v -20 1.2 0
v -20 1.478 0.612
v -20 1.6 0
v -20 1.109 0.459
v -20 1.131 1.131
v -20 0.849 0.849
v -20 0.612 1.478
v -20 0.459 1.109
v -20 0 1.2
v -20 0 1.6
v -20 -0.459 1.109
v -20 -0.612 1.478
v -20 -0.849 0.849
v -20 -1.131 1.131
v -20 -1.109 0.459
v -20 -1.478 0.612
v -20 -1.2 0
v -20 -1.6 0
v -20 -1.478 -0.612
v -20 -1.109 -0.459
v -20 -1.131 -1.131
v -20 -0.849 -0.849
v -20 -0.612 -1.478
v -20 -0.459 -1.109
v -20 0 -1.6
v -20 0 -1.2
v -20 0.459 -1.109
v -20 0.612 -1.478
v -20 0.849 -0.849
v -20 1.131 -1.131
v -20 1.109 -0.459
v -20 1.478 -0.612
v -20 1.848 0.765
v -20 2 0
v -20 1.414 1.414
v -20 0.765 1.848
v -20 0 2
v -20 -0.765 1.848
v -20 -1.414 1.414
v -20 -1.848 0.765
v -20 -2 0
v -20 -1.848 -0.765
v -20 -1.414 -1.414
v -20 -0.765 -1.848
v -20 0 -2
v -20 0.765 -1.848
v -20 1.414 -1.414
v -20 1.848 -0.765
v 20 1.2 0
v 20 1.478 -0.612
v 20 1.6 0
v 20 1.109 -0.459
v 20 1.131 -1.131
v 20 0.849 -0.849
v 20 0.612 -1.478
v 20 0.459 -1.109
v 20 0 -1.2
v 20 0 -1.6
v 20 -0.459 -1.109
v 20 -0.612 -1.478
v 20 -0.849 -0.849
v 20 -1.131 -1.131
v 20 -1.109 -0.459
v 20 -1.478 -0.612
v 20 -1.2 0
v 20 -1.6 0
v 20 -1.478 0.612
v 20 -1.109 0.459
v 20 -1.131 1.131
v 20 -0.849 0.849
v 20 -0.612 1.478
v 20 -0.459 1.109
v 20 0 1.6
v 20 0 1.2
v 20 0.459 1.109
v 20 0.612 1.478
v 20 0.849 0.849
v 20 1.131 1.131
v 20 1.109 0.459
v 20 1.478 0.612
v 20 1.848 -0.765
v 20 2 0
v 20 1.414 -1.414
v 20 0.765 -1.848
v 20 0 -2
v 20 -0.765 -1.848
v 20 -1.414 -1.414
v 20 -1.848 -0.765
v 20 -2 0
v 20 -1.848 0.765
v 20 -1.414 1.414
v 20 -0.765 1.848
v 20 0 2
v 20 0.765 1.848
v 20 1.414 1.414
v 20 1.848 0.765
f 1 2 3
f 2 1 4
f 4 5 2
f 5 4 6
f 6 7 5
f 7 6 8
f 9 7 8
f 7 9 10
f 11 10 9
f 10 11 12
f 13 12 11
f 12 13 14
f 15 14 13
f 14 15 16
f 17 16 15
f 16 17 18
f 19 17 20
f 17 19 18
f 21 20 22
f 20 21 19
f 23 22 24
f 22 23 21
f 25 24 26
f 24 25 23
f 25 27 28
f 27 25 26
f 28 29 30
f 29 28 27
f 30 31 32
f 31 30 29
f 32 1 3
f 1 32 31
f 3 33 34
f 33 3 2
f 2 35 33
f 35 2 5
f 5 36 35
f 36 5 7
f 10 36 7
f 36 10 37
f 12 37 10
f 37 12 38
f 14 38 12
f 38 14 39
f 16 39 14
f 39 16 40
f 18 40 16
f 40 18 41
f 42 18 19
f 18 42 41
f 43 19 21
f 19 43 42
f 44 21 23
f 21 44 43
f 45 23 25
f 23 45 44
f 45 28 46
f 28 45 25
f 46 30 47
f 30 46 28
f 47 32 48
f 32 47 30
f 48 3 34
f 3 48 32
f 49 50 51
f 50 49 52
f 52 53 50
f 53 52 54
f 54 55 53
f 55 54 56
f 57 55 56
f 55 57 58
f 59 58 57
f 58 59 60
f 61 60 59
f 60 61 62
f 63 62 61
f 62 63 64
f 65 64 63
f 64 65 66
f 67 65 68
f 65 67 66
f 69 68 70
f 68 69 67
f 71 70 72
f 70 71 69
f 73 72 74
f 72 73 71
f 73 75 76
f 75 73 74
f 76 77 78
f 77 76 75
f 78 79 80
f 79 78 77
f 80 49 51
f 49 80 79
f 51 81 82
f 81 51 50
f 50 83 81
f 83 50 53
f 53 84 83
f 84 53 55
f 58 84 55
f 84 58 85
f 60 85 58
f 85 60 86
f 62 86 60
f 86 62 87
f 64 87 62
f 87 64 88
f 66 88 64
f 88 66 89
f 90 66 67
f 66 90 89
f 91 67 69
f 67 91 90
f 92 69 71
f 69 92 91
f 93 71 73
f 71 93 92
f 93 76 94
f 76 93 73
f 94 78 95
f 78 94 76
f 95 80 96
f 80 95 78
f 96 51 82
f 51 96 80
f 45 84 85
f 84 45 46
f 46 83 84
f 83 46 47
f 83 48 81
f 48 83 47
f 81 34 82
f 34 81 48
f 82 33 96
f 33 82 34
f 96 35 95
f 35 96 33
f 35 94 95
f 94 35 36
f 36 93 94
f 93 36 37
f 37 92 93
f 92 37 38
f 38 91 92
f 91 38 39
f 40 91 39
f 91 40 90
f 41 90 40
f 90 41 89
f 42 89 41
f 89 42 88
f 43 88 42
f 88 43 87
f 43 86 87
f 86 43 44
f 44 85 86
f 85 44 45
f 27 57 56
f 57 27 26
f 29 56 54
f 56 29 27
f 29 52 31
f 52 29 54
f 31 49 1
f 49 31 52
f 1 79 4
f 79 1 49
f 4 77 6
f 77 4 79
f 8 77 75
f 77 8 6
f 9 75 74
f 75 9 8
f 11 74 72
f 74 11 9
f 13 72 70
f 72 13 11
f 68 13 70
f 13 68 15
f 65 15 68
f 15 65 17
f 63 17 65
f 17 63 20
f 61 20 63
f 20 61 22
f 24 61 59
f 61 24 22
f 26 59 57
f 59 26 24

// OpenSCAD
// file: ../p/4-4cyli.scad
use <../lib.scad>
function ldraw_lib__4_4cyli() = [
// 0 Cylinder 1.0
// 0 Name: 4-4cyli.dat
// 0 Author: James Jessiman
// 0 !LDRAW_ORG Primitive UPDATE 2005-01
// 0 !LICENSE Licensed under CC BY 2.0 and CC BY 4.0 : see CAreadme.txt
// 
// 0 BFC CERTIFY CCW
  [0,"BFC","CERTIFY"],
  [0,"BFC","CCW"],
// 
// 0 !HISTORY 1998-12-15 [PTadmin] Official Update 1998-10
// 0 !HISTORY 2002-03-23 [sbliss] Added BFC statement; merged headers from files in distributions LDraw 0.27 and Complete.
// 0 !HISTORY 2002-04-25 [PTadmin] Official Update 2002-02
// 0 !HISTORY 2004-12-14 [guyvivan] BFC CCW
// 0 !HISTORY 2005-12-28 [PTadmin] Official Update 2005-01
// 0 !HISTORY 2007-06-24 [PTadmin] Header formatted for Contributor Agreement
// 0 !HISTORY 2008-07-01 [PTadmin] Official Update 2008-01
// 
// 
// 4 16 1 1 0 0.9239 1 0.3827 0.9239 0 0.3827 1 0 0
  [4,16,1,1,0,0.9239,1,0.3827,0.9239,0,0.3827,1,0,0],
// 5 24 1 0 0 1 1 0 0.9239 0 0.3827 0.9239 0 -0.3827
  [5,24,1,0,0,1,1,0,0.9239,0,0.3827,0.9239,0,-0.3827],
// 4 16 0.9239 1 0.3827 0.7071 1 0.7071 0.7071 0 0.7071 0.9239 0 0.3827
  [4,16,0.9239,1,0.3827,0.7071,1,0.7071,0.7071,0,0.7071,0.9239,0,0.3827],
// 5 24 0.9239 0 0.3827 0.9239 1 0.3827 0.7071 0 0.7071 1 0 0
  [5,24,0.9239,0,0.3827,0.9239,1,0.3827,0.7071,0,0.7071,1,0,0],
// 4 16 0.7071 1 0.7071 0.3827 1 0.9239 0.3827 0 0.9239 0.7071 0 0.7071
  [4,16,0.7071,1,0.7071,0.3827,1,0.9239,0.3827,0,0.9239,0.7071,0,0.7071],
// 5 24 0.7071 0 0.7071 0.7071 1 0.7071 0.3827 0 0.9239 0.9239 0 0.3827
  [5,24,0.7071,0,0.7071,0.7071,1,0.7071,0.3827,0,0.9239,0.9239,0,0.3827],
// 4 16 0.3827 1 0.9239 0 1 1 0 0 1 0.3827 0 0.9239
  [4,16,0.3827,1,0.9239,0,1,1,0,0,1,0.3827,0,0.9239],
// 5 24 0.3827 0 0.9239 0.3827 1 0.9239 0 0 1 0.7071 0 0.7071
  [5,24,0.3827,0,0.9239,0.3827,1,0.9239,0,0,1,0.7071,0,0.7071],
// 4 16 0 1 1 -0.3827 1 0.9239 -0.3827 0 0.9239 0 0 1
  [4,16,0,1,1,-0.3827,1,0.9239,-0.3827,0,0.9239,0,0,1],
// 5 24 0 0 1 0 1 1 -0.3827 0 0.9239 0.3827 0 0.9239
  [5,24,0,0,1,0,1,1,-0.3827,0,0.9239,0.3827,0,0.9239],
// 4 16 -0.3827 1 0.9239 -0.7071 1 0.7071 -0.7071 0 0.7071 -0.3827 0 0.9239
  [4,16,-0.3827,1,0.9239,-0.7071,1,0.7071,-0.7071,0,0.7071,-0.3827,0,0.9239],
// 5 24 -0.3827 0 0.9239 -0.3827 1 0.9239 -0.7071 0 0.7071 0 0 1
  [5,24,-0.3827,0,0.9239,-0.3827,1,0.9239,-0.7071,0,0.7071,0,0,1],
// 4 16 -0.7071 1 0.7071 -0.9239 1 0.3827 -0.9239 0 0.3827 -0.7071 0 0.7071
  [4,16,-0.7071,1,0.7071,-0.9239,1,0.3827,-0.9239,0,0.3827,-0.7071,0,0.7071],
// 5 24 -0.7071 0 0.7071 -0.7071 1 0.7071 -0.9239 0 0.3827 -0.3827 0 0.9239
  [5,24,-0.7071,0,0.7071,-0.7071,1,0.7071,-0.9239,0,0.3827,-0.3827,0,0.9239],
// 4 16 -0.9239 1 0.3827 -1 1 0 -1 0 0 -0.9239 0 0.3827
  [4,16,-0.9239,1,0.3827,-1,1,0,-1,0,0,-0.9239,0,0.3827],
// 5 24 -0.9239 0 0.3827 -0.9239 1 0.3827 -1 0 0 -0.7071 0 0.7071
  [5,24,-0.9239,0,0.3827,-0.9239,1,0.3827,-1,0,0,-0.7071,0,0.7071],
// 4 16 -1 1 0 -0.9239 1 -0.3827 -0.9239 0 -0.3827 -1 0 0
  [4,16,-1,1,0,-0.9239,1,-0.3827,-0.9239,0,-0.3827,-1,0,0],
// 5 24 -1 0 0 -1 1 0 -0.9239 0 -0.3827 -0.9239 0 0.3827
  [5,24,-1,0,0,-1,1,0,-0.9239,0,-0.3827,-0.9239,0,0.3827],
// 4 16 -0.9239 1 -0.3827 -0.7071 1 -0.7071 -0.7071 0 -0.7071 -0.9239 0 -0.3827
  [4,16,-0.9239,1,-0.3827,-0.7071,1,-0.7071,-0.7071,0,-0.7071,-0.9239,0,-0.3827],
// 5 24 -0.9239 0 -0.3827 -0.9239 1 -0.3827 -0.7071 0 -0.7071 -1 0 0
  [5,24,-0.9239,0,-0.3827,-0.9239,1,-0.3827,-0.7071,0,-0.7071,-1,0,0],
// 4 16 -0.7071 1 -0.7071 -0.3827 1 -0.9239 -0.3827 0 -0.9239 -0.7071 0 -0.7071
  [4,16,-0.7071,1,-0.7071,-0.3827,1,-0.9239,-0.3827,0,-0.9239,-0.7071,0,-0.7071],
// 5 24 -0.7071 0 -0.7071 -0.7071 1 -0.7071 -0.3827 0 -0.9239 -0.9239 0 -0.3827
  [5,24,-0.7071,0,-0.7071,-0.7071,1,-0.7071,-0.3827,0,-0.9239,-0.9239,0,-0.3827],
// 4 16 -0.3827 1 -0.9239 0 1 -1 0 0 -1 -0.3827 0 -0.9239
  [4,16,-0.3827,1,-0.9239,0,1,-1,0,0,-1,-0.3827,0,-0.9239],
// 5 24 -0.3827 0 -0.9239 -0.3827 1 -0.9239 0 0 -1 -0.7071 0 -0.7071
  [5,24,-0.3827,0,-0.9239,-0.3827,1,-0.9239,0,0,-1,-0.7071,0,-0.7071],
// 4 16 0 1 -1 0.3827 1 -0.9239 0.3827 0 -0.9239 0 0 -1
  [4,16,0,1,-1,0.3827,1,-0.9239,0.3827,0,-0.9239,0,0,-1],
// 5 24 0 0 -1 0 1 -1 0.3827 0 -0.9239 -0.3827 0 -0.9239
  [5,24,0,0,-1,0,1,-1,0.3827,0,-0.9239,-0.3827,0,-0.9239],
// 4 16 0.3827 1 -0.9239 0.7071 1 -0.7071 0.7071 0 -0.7071 0.3827 0 -0.9239
  [4,16,0.3827,1,-0.9239,0.7071,1,-0.7071,0.7071,0,-0.7071,0.3827,0,-0.9239],
// 5 24 0.3827 0 -0.9239 0.3827 1 -0.9239 0.7071 0 -0.7071 0 0 -1
  [5,24,0.3827,0,-0.9239,0.3827,1,-0.9239,0.7071,0,-0.7071,0,0,-1],
// 4 16 0.7071 1 -0.7071 0.9239 1 -0.3827 0.9239 0 -0.3827 0.7071 0 -0.7071
  [4,16,0.7071,1,-0.7071,0.9239,1,-0.3827,0.9239,0,-0.3827,0.7071,0,-0.7071],
// 5 24 0.7071 0 -0.7071 0.7071 1 -0.7071 0.9239 0 -0.3827 0.3827 0 -0.9239
  [5,24,0.7071,0,-0.7071,0.7071,1,-0.7071,0.9239,0,-0.3827,0.3827,0,-0.9239],
// 4 16 0.9239 1 -0.3827 1 1 0 1 0 0 0.9239 0 -0.3827
  [4,16,0.9239,1,-0.3827,1,1,0,1,0,0,0.9239,0,-0.3827],
// 5 24 0.9239 0 -0.3827 0.9239 1 -0.3827 1 0 0 0.7071 0 -0.7071
  [5,24,0.9239,0,-0.3827,0.9239,1,-0.3827,1,0,0,0.7071,0,-0.7071],
// 0
];
module ldraw_lib__4_4cyli(step=0, col=false, unit=2/5, alt=false, line=0.2, solid=!$preview)
    makepoly(ldraw_lib__4_4cyli(), step=step, col=col, unit=unit, alt=alt, line=line, solid=solid);
ldraw_lib__4_4cyli(line=0.2);
// file: ../p/4-4ring4.scad
use <../lib.scad>
function ldraw_lib__4_4ring4() = [
// 0 Ring  4 x 1.0
// 0 Name: 4-4ring4.dat
// 0 Author: James Jessiman
// 0 !LDRAW_ORG Primitive UPDATE 2009-01
// 0 !LICENSE Licensed under CC BY 2.0 and CC BY 4.0 : see CAreadme.txt
// 
// 0 BFC CERTIFY CCW
  [0,"BFC","CERTIFY"],
  [0,"BFC","CCW"],
// 
// 0 !HISTORY 1998-12-15 [PTadmin] Official Update 1998-10
// 0 !HISTORY 2002-04-08 [BrickCaster] Modified for BFC compliance
// 0 !HISTORY 2002-04-25 [PTadmin] Official Update 2002-02
// 0 !HISTORY 2007-06-24 [PTadmin] Header formatted for Contributor Agreement
// 0 !HISTORY 2008-07-01 [PTadmin] Official Update 2008-01
// 0 !HISTORY 2008-08-26 [cwdee] Switch polygon winding and rename
// 0 !HISTORY 2009-05-02 [PTadmin] Official Update 2009-01
// 
// 
// 4 16 -1.9135 0 4.6195 -1.5308 0 3.6956 0 0 4 0 0 5
  [4,16,-1.9135,0,4.6195,-1.5308,0,3.6956,0,0,4,0,0,5],
// 4 16 -3.5355 0 3.5355 -2.8284 0 2.8284 -1.5308 0 3.6956 -1.9135 0 4.6195
  [4,16,-3.5355,0,3.5355,-2.8284,0,2.8284,-1.5308,0,3.6956,-1.9135,0,4.6195],
// 4 16 -4.6195 0 1.9135 -3.6956 0 1.5308 -2.8284 0 2.8284 -3.5355 0 3.5355
  [4,16,-4.6195,0,1.9135,-3.6956,0,1.5308,-2.8284,0,2.8284,-3.5355,0,3.5355],
// 4 16 -5 0 0 -4 0 0 -3.6956 0 1.5308 -4.6195 0 1.9135
  [4,16,-5,0,0,-4,0,0,-3.6956,0,1.5308,-4.6195,0,1.9135],
// 4 16 -4.6195 0 -1.9135 -3.6956 0 -1.5308 -4 0 0 -5 0 0
  [4,16,-4.6195,0,-1.9135,-3.6956,0,-1.5308,-4,0,0,-5,0,0],
// 4 16 -3.5355 0 -3.5355 -2.8284 0 -2.8284 -3.6956 0 -1.5308 -4.6195 0 -1.9135
  [4,16,-3.5355,0,-3.5355,-2.8284,0,-2.8284,-3.6956,0,-1.5308,-4.6195,0,-1.9135],
// 4 16 -1.9135 0 -4.6195 -1.5308 0 -3.6956 -2.8284 0 -2.8284 -3.5355 0 -3.5355
  [4,16,-1.9135,0,-4.6195,-1.5308,0,-3.6956,-2.8284,0,-2.8284,-3.5355,0,-3.5355],
// 4 16 0 0 -5 0 0 -4 -1.5308 0 -3.6956 -1.9135 0 -4.6195
  [4,16,0,0,-5,0,0,-4,-1.5308,0,-3.6956,-1.9135,0,-4.6195],
// 4 16 1.9135 0 -4.6195 1.5308 0 -3.6956 0 0 -4 0 0 -5
  [4,16,1.9135,0,-4.6195,1.5308,0,-3.6956,0,0,-4,0,0,-5],
// 4 16 3.5355 0 -3.5355 2.8284 0 -2.8284 1.5308 0 -3.6956 1.9135 0 -4.6195
  [4,16,3.5355,0,-3.5355,2.8284,0,-2.8284,1.5308,0,-3.6956,1.9135,0,-4.6195],
// 4 16 4.6195 0 -1.9135 3.6956 0 -1.5308 2.8284 0 -2.8284 3.5355 0 -3.5355
  [4,16,4.6195,0,-1.9135,3.6956,0,-1.5308,2.8284,0,-2.8284,3.5355,0,-3.5355],
// 4 16 5 0 0 4 0 0 3.6956 0 -1.5308 4.6195 0 -1.9135
  [4,16,5,0,0,4,0,0,3.6956,0,-1.5308,4.6195,0,-1.9135],
// 4 16 4.6195 0 1.9135 3.6956 0 1.5308 4 0 0 5 0 0
  [4,16,4.6195,0,1.9135,3.6956,0,1.5308,4,0,0,5,0,0],
// 4 16 3.5355 0 3.5355 2.8284 0 2.8284 3.6956 0 1.5308 4.6195 0 1.9135
  [4,16,3.5355,0,3.5355,2.8284,0,2.8284,3.6956,0,1.5308,4.6195,0,1.9135],
// 4 16 1.9135 0 4.6195 1.5308 0 3.6956 2.8284 0 2.8284 3.5355 0 3.5355
  [4,16,1.9135,0,4.6195,1.5308,0,3.6956,2.8284,0,2.8284,3.5355,0,3.5355],
// 4 16 0 0 5 0 0 4 1.5308 0 3.6956 1.9135 0 4.6195
  [4,16,0,0,5,0,0,4,1.5308,0,3.6956,1.9135,0,4.6195],
// 0
];
module ldraw_lib__4_4ring4(step=0, col=false, unit=2/5, alt=false, line=0.2, solid=!$preview)
    makepoly(ldraw_lib__4_4ring4(), step=step, col=col, unit=unit, alt=alt, line=line, solid=solid);
ldraw_lib__4_4ring4(line=0.2);
// file: ../p/4-4ring3.scad
use <../lib.scad>
function ldraw_lib__4_4ring3() = [
// 0 Ring  3 x 1.0
// 0 Name: 4-4ring3.dat
// 0 Author: James Jessiman
// 0 !LDRAW_ORG Primitive UPDATE 2009-01
// 0 !LICENSE Licensed under CC BY 2.0 and CC BY 4.0 : see CAreadme.txt
// 
// 0 BFC CERTIFY CCW
  [0,"BFC","CERTIFY"],
  [0,"BFC","CCW"],
// 
// 0 !HISTORY 1998-12-15 [PTadmin] Official Update 1998-10
// 0 !HISTORY 2002-04-05 [hafhead] Added BFC statement
// 0 !HISTORY 2002-04-25 [PTadmin] Official Update 2002-02
// 0 !HISTORY 2007-06-24 [PTadmin] Header formatted for Contributor Agreement
// 0 !HISTORY 2008-07-01 [PTadmin] Official Update 2008-01
// 0 !HISTORY 2008-08-26 [cwdee] Switch polygon winding and rename
// 0 !HISTORY 2009-05-02 [PTadmin] Official Update 2009-01
// 
// 
// 4 16 -1.5308 0 3.6956 -1.1481 0 2.7717 0 0 3 0 0 4
  [4,16,-1.5308,0,3.6956,-1.1481,0,2.7717,0,0,3,0,0,4],
// 4 16 -2.8284 0 2.8284 -2.1213 0 2.1213 -1.1481 0 2.7717 -1.5308 0 3.6956
  [4,16,-2.8284,0,2.8284,-2.1213,0,2.1213,-1.1481,0,2.7717,-1.5308,0,3.6956],
// 4 16 -3.6956 0 1.5308 -2.7717 0 1.1481 -2.1213 0 2.1213 -2.8284 0 2.8284
  [4,16,-3.6956,0,1.5308,-2.7717,0,1.1481,-2.1213,0,2.1213,-2.8284,0,2.8284],
// 4 16 -4 0 0 -3 0 0 -2.7717 0 1.1481 -3.6956 0 1.5308
  [4,16,-4,0,0,-3,0,0,-2.7717,0,1.1481,-3.6956,0,1.5308],
// 4 16 -3.6956 0 -1.5308 -2.7717 0 -1.1481 -3 0 0 -4 0 0
  [4,16,-3.6956,0,-1.5308,-2.7717,0,-1.1481,-3,0,0,-4,0,0],
// 4 16 -2.8284 0 -2.8284 -2.1213 0 -2.1213 -2.7717 0 -1.1481 -3.6956 0 -1.5308
  [4,16,-2.8284,0,-2.8284,-2.1213,0,-2.1213,-2.7717,0,-1.1481,-3.6956,0,-1.5308],
// 4 16 -1.5308 0 -3.6956 -1.1481 0 -2.7717 -2.1213 0 -2.1213 -2.8284 0 -2.8284
  [4,16,-1.5308,0,-3.6956,-1.1481,0,-2.7717,-2.1213,0,-2.1213,-2.8284,0,-2.8284],
// 4 16 0 0 -4 0 0 -3 -1.1481 0 -2.7717 -1.5308 0 -3.6956
  [4,16,0,0,-4,0,0,-3,-1.1481,0,-2.7717,-1.5308,0,-3.6956],
// 4 16 1.5308 0 -3.6956 1.1481 0 -2.7717 0 0 -3 0 0 -4
  [4,16,1.5308,0,-3.6956,1.1481,0,-2.7717,0,0,-3,0,0,-4],
// 4 16 2.8284 0 -2.8284 2.1213 0 -2.1213 1.1481 0 -2.7717 1.5308 0 -3.6956
  [4,16,2.8284,0,-2.8284,2.1213,0,-2.1213,1.1481,0,-2.7717,1.5308,0,-3.6956],
// 4 16 3.6956 0 -1.5308 2.7717 0 -1.1481 2.1213 0 -2.1213 2.8284 0 -2.8284
  [4,16,3.6956,0,-1.5308,2.7717,0,-1.1481,2.1213,0,-2.1213,2.8284,0,-2.8284],
// 4 16 4 0 0 3 0 0 2.7717 0 -1.1481 3.6956 0 -1.5308
  [4,16,4,0,0,3,0,0,2.7717,0,-1.1481,3.6956,0,-1.5308],
// 4 16 3.6956 0 1.5308 2.7717 0 1.1481 3 0 0 4 0 0
  [4,16,3.6956,0,1.5308,2.7717,0,1.1481,3,0,0,4,0,0],
// 4 16 2.8284 0 2.8284 2.1213 0 2.1213 2.7717 0 1.1481 3.6956 0 1.5308
  [4,16,2.8284,0,2.8284,2.1213,0,2.1213,2.7717,0,1.1481,3.6956,0,1.5308],
// 4 16 1.5308 0 3.6956 1.1481 0 2.7717 2.1213 0 2.1213 2.8284 0 2.8284
  [4,16,1.5308,0,3.6956,1.1481,0,2.7717,2.1213,0,2.1213,2.8284,0,2.8284],
// 4 16 0 0 4 0 0 3 1.1481 0 2.7717 1.5308 0 3.6956
  [4,16,0,0,4,0,0,3,1.1481,0,2.7717,1.5308,0,3.6956],
// 0
];
module ldraw_lib__4_4ring3(step=0, col=false, unit=2/5, alt=false, line=0.2, solid=!$preview)
    makepoly(ldraw_lib__4_4ring3(), step=step, col=col, unit=unit, alt=alt, line=line, solid=solid);
ldraw_lib__4_4ring3(line=0.2);
// file: ../p/4-4edge.scad
use <../lib.scad>
function ldraw_lib__4_4edge() = [
// 0 Circle 1.0
// 0 Name: 4-4edge.dat
// 0 Author: James Jessiman
// 0 !LDRAW_ORG Primitive UPDATE 2017-01
// 0 !LICENSE Licensed under CC BY 2.0 and CC BY 4.0 : see CAreadme.txt
// 
// 0 BFC CERTIFY CCW
  [0,"BFC","CERTIFY"],
  [0,"BFC","CCW"],
// 
// 0 !HISTORY 1998-12-15 [PTadmin] Official Update 1998-10
// 0 !HISTORY 2005-12-28 [PTadmin] Official Update 2005-01
// 0 !HISTORY 2007-06-24 [PTadmin] Header formatted for Contributor Agreement
// 0 !HISTORY 2008-07-01 [PTadmin] Official Update 2008-01
// 0 !HISTORY 2017-01-15 [Steffen] BFCed
// 0 !HISTORY 2017-12-30 [PTadmin] Official Update 2017-01
// 
// 
// 2 24 1 0 0 0.9239 0 0.3827
  [2,24,1,0,0,0.9239,0,0.3827],
// 2 24 0.9239 0 0.3827 0.7071 0 0.7071
  [2,24,0.9239,0,0.3827,0.7071,0,0.7071],
// 2 24 0.7071 0 0.7071 0.3827 0 0.9239
  [2,24,0.7071,0,0.7071,0.3827,0,0.9239],
// 2 24 0.3827 0 0.9239 0 0 1
  [2,24,0.3827,0,0.9239,0,0,1],
// 2 24 0 0 1 -0.3827 0 0.9239
  [2,24,0,0,1,-0.3827,0,0.9239],
// 2 24 -0.3827 0 0.9239 -0.7071 0 0.7071
  [2,24,-0.3827,0,0.9239,-0.7071,0,0.7071],
// 2 24 -0.7071 0 0.7071 -0.9239 0 0.3827
  [2,24,-0.7071,0,0.7071,-0.9239,0,0.3827],
// 2 24 -0.9239 0 0.3827 -1 0 -0
  [2,24,-0.9239,0,0.3827,-1,0,-0],
// 2 24 -1 0 -0 -0.9239 0 -0.3827
  [2,24,-1,0,-0,-0.9239,0,-0.3827],
// 2 24 -0.9239 0 -0.3827 -0.7071 0 -0.7071
  [2,24,-0.9239,0,-0.3827,-0.7071,0,-0.7071],
// 2 24 -0.7071 0 -0.7071 -0.3827 0 -0.9239
  [2,24,-0.7071,0,-0.7071,-0.3827,0,-0.9239],
// 2 24 -0.3827 0 -0.9239 0 0 -1
  [2,24,-0.3827,0,-0.9239,0,0,-1],
// 2 24 0 0 -1 0.3827 0 -0.9239
  [2,24,0,0,-1,0.3827,0,-0.9239],
// 2 24 0.3827 0 -0.9239 0.7071 0 -0.7071
  [2,24,0.3827,0,-0.9239,0.7071,0,-0.7071],
// 2 24 0.7071 0 -0.7071 0.9239 0 -0.3827
  [2,24,0.7071,0,-0.7071,0.9239,0,-0.3827],
// 2 24 0.9239 0 -0.3827 1 0 0
  [2,24,0.9239,0,-0.3827,1,0,0],
];
module ldraw_lib__4_4edge(step=0, col=false, unit=2/5, alt=false, line=0.2, solid=!$preview)
    makepoly(ldraw_lib__4_4edge(), step=step, col=col, unit=unit, alt=alt, line=line, solid=solid);
ldraw_lib__4_4edge(line=0.2);
// file: 71533k03.scad
use <../lib.scad>
use <../p/4-4cyli.scad>
function ldraw_lib__71533k03() = [
// 0 ~Technic Pneumatic Tube Segment
// 0 Name: 71533k03.dat
// 0 Author: Jaco van der Molen [Jaco]
// 0 !LDRAW_ORG Part Flexible_Section UPDATE 2020-01
// 0 !LICENSE Licensed under CC BY 2.0 and CC BY 4.0 : see CAreadme.txt
// 
// 0 BFC CERTIFY CW
  [0,"BFC","CERTIFY"],
  [0,"BFC","CW"],
// 
// 0 !HISTORY 2003-11-30 [Steffen] BFCed
// 0 !HISTORY 2009-12-29 [PTadmin] Official Update 2009-03
// 0 !HISTORY 2020-06-27 [PTadmin] Renamed from 166
// 0 !HISTORY 2020-06-28 [PTadmin] Official Update 2020-01
// 
// 
// 1 16 0 0 0 5 0 0 0 1 0 0 0 5 4-4cyli.dat
  [1,16,0,0,0,5,0,0,0,1,0,0,0,5, ldraw_lib__4_4cyli()],
// 0 BFC INVERTNEXT
  [0,"BFC","INVERTNEXT"],
// 1 16 0 0 0 3 0 0 0 1 0 0 0 3 4-4cyli.dat
  [1,16,0,0,0,3,0,0,0,1,0,0,0,3, ldraw_lib__4_4cyli()],
// 0
];
module ldraw_lib__71533k03(step=0, col=false, unit=2/5, alt=false, line=0.2, solid=!$preview)
    makepoly(ldraw_lib__71533k03(), step=step, col=col, unit=unit, alt=alt, line=line, solid=solid);
ldraw_lib__71533k03(line=0.2);
// file: 71533k02.scad
use <../lib.scad>
use <../p/4-4edge.scad>
use <../p/4-4ring3.scad>
use <../p/4-4ring4.scad>
function ldraw_lib__71533k02() = [
// 0 ~Technic Pneumatic Tube End (Non-Bulged)
// 0 Name: 71533k02.dat
// 0 Author: Steffen [Steffen]
// 0 !LDRAW_ORG Part Flexible_Section UPDATE 2020-01
// 0 !LICENSE Licensed under CC BY 2.0 and CC BY 4.0 : see CAreadme.txt
// 
// 0 BFC CERTIFY CCW
  [0,"BFC","CERTIFY"],
  [0,"BFC","CCW"],
// 
// 0 !HISTORY 2020-06-28 [PTadmin] Official Update 2020-01
// 
// 
// 0 // This file goes together with 71533k01.dat and 71533k03.dat.
// 0 // Those 3 files can be used to create Technic Pneumatic Tubes
// 0 // with either bulged or non-bulged ends.
// 
// 1 16 0 0 0 1 0 0 0 1 0 0 0 1 4-4ring3.dat
  [1,16,0,0,0,1,0,0,0,1,0,0,0,1, ldraw_lib__4_4ring3()],
// 1 16 0 0 0 1 0 0 0 1 0 0 0 1 4-4ring4.dat
  [1,16,0,0,0,1,0,0,0,1,0,0,0,1, ldraw_lib__4_4ring4()],
// 1 16 0 0 0 3 0 0 0 3 0 0 0 3 4-4edge.dat
  [1,16,0,0,0,3,0,0,0,3,0,0,0,3, ldraw_lib__4_4edge()],
// 1 16 0 0 0 5 0 0 0 5 0 0 0 5 4-4edge.dat
  [1,16,0,0,0,5,0,0,0,5,0,0,0,5, ldraw_lib__4_4edge()],
];
module ldraw_lib__71533k02(step=0, col=false, unit=2/5, alt=false, line=0.2, solid=!$preview)
    makepoly(ldraw_lib__71533k02(), step=step, col=col, unit=unit, alt=alt, line=line, solid=solid);
ldraw_lib__71533k02(line=0.2);
// main file
use <../lib.scad>
use <71533k02.scad>
use <71533k03.scad>
function ldraw_lib__14653_f1() = [
// 0 Technic Pneumatic Tube  5L
// 0 Name: 14653-f1.dat
// 0 Author: Philippe Hurbain [Philo]
// 0 !LDRAW_ORG Part UPDATE 2020-01
// 0 !LICENSE Licensed under CC BY 2.0 and CC BY 4.0 : see CAreadme.txt
// 
// 0 BFC CERTIFY CCW
  [0,"BFC","CERTIFY"],
  [0,"BFC","CCW"],
// 
// 0 !KEYWORDS 40 mm
// 
// 0 !HISTORY 2020-06-28 [PTadmin] Official Update 2020-01
// 
// 
// 1 16 -50 0 0 0 1 0 1 0 0 0 0 1 71533k02.dat
  [1,16,-50,0,0,0,1,0,1,0,0,0,0,1, ldraw_lib__71533k02()],
// 1 16 50 0 0 0 -1 0 -1 0 0 0 0 1 71533k02.dat
  [1,16,50,0,0,0,-1,0,-1,0,0,0,0,1, ldraw_lib__71533k02()],
// 1 16 -50 0 0 0 100 0 1 0 0 0 0 1 71533k03.dat
  [1,16,-50,0,0,0,100,0,1,0,0,0,0,1, ldraw_lib__71533k03()],
];
module ldraw_lib__14653_f1(step=0, col=false, unit=2/5, alt=false, line=0.2, solid=!$preview)
    makepoly(ldraw_lib__14653_f1(), step=step, col=col, unit=unit, alt=alt, line=line, solid=solid);
ldraw_lib__14653_f1(line=0.2);
